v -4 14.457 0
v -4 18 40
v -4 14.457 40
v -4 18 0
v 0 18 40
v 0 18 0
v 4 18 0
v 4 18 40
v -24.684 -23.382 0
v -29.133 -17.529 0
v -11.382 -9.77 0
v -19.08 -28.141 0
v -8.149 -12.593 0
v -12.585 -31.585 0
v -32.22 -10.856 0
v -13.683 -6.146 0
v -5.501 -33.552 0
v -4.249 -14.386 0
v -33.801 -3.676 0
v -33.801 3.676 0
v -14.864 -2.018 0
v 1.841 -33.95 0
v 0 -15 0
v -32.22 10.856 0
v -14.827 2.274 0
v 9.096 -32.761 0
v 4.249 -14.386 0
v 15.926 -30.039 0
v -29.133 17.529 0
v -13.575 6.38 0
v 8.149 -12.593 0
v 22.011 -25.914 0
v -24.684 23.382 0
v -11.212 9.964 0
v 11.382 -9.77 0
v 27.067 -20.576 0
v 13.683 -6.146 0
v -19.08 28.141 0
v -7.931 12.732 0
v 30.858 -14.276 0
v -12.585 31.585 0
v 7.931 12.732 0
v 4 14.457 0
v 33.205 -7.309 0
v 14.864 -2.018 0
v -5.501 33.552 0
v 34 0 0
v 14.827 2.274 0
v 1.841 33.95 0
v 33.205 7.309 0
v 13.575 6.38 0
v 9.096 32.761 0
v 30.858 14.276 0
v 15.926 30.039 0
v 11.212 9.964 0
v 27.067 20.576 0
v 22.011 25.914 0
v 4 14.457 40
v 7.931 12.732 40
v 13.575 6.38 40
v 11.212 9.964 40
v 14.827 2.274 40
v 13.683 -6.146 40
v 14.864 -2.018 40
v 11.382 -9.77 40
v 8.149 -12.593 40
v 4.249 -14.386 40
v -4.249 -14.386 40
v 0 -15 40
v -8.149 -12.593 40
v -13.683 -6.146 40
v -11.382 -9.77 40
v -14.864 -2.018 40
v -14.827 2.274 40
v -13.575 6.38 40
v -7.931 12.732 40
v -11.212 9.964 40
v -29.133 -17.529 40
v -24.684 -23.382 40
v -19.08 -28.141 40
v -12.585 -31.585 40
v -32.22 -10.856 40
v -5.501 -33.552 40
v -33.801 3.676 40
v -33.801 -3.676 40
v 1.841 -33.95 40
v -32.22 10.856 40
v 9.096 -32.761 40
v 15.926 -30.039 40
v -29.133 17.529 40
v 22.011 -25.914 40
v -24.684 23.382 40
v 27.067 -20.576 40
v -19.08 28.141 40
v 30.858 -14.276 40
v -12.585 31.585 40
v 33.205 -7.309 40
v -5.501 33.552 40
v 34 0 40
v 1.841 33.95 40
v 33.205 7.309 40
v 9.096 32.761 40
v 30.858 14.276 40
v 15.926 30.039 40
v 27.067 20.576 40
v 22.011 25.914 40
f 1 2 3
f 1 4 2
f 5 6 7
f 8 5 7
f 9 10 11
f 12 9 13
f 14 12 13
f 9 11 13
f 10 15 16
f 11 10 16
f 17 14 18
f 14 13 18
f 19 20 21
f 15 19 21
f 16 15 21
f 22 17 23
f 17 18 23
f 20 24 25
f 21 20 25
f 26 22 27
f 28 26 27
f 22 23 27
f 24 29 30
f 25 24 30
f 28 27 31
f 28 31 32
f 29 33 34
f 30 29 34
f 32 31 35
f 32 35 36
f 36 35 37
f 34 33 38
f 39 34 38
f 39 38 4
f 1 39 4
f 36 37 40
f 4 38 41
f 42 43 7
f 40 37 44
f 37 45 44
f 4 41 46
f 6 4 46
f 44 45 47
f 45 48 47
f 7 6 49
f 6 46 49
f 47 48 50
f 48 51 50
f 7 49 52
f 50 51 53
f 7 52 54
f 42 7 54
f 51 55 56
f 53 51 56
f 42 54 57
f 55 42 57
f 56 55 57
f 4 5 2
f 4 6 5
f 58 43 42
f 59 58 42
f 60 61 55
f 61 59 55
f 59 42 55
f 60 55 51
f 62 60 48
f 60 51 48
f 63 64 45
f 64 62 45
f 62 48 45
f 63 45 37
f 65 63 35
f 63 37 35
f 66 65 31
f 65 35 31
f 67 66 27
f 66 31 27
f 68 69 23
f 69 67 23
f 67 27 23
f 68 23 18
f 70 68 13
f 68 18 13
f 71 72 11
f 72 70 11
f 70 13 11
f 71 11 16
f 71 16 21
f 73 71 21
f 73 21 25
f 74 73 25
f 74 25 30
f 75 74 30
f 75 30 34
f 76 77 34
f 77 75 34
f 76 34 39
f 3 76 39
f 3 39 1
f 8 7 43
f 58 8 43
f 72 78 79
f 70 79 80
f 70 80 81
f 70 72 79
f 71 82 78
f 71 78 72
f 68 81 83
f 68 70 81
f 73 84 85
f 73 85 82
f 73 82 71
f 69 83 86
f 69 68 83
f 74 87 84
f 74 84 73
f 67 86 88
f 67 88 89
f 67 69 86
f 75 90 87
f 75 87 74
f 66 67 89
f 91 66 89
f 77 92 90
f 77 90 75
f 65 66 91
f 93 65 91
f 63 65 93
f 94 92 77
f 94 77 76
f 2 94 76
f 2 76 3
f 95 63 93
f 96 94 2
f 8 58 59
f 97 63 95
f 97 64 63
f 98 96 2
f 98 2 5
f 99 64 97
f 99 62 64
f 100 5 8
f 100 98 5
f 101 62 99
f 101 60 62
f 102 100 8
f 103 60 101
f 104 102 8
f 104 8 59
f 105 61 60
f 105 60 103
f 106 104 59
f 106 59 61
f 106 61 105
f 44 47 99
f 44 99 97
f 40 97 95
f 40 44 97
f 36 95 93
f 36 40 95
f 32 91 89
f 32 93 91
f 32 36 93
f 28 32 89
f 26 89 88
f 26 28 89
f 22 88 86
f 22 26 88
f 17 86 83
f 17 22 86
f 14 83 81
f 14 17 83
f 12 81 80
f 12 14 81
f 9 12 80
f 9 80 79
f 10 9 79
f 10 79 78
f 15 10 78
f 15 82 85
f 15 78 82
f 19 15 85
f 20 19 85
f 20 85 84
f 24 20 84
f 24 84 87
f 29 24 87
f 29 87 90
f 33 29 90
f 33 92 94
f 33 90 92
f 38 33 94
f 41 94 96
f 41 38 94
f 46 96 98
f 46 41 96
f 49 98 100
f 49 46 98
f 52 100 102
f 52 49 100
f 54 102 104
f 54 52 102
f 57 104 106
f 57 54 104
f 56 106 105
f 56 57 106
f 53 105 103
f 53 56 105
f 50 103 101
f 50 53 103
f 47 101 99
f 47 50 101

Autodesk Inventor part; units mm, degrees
ref_plane "YZ Plane" through (0, 0, 0) normal (1, 0, 0) x (0, 1, 0)
ref_plane "XZ Plane" through (0, 0, 0) normal (0, 1, 0) x (-1, 0, 0)
ref_plane "XY Plane" through (0, 0, 0) normal (0, 0, 1) x (1, 0, 0)
sketch "スケッチ1" plane through (0, 0, 0) normal (0, 0, 1) x (1, 0, 0)
  circle A0 centre (0, 0) radius 34
  arc A1 (-4, 14.4568) -> (4, 14.4568) centre (0, 0) ccw
  line L0 (0, 15) -> (0, 11)
  line L1 (0, 15) -> (0, 18)
  line L2 (0, 18) -> (4, 18)
  line L3 (4, 18) -> (4, 14.4568)
  line L4 (4, 11) -> (0, 11)
  line L5 (0, 18) -> (-4, 18)
  line L6 (-4, 18) -> (-4, 14.4568)
  line L7 (-4, 11) -> (0, 11)
  point P0 (-4, 14.5)
  point P1 (4, 14.5)
  dimension "d0" = 68
  dimension "d1" = 30
  dimension "d2" = 4
  dimension "d3" = 3
  dimension "d4" = 4
extrude "押し出し1" add sketch "スケッチ1" along normal blind 40
properties part number "gear1"
